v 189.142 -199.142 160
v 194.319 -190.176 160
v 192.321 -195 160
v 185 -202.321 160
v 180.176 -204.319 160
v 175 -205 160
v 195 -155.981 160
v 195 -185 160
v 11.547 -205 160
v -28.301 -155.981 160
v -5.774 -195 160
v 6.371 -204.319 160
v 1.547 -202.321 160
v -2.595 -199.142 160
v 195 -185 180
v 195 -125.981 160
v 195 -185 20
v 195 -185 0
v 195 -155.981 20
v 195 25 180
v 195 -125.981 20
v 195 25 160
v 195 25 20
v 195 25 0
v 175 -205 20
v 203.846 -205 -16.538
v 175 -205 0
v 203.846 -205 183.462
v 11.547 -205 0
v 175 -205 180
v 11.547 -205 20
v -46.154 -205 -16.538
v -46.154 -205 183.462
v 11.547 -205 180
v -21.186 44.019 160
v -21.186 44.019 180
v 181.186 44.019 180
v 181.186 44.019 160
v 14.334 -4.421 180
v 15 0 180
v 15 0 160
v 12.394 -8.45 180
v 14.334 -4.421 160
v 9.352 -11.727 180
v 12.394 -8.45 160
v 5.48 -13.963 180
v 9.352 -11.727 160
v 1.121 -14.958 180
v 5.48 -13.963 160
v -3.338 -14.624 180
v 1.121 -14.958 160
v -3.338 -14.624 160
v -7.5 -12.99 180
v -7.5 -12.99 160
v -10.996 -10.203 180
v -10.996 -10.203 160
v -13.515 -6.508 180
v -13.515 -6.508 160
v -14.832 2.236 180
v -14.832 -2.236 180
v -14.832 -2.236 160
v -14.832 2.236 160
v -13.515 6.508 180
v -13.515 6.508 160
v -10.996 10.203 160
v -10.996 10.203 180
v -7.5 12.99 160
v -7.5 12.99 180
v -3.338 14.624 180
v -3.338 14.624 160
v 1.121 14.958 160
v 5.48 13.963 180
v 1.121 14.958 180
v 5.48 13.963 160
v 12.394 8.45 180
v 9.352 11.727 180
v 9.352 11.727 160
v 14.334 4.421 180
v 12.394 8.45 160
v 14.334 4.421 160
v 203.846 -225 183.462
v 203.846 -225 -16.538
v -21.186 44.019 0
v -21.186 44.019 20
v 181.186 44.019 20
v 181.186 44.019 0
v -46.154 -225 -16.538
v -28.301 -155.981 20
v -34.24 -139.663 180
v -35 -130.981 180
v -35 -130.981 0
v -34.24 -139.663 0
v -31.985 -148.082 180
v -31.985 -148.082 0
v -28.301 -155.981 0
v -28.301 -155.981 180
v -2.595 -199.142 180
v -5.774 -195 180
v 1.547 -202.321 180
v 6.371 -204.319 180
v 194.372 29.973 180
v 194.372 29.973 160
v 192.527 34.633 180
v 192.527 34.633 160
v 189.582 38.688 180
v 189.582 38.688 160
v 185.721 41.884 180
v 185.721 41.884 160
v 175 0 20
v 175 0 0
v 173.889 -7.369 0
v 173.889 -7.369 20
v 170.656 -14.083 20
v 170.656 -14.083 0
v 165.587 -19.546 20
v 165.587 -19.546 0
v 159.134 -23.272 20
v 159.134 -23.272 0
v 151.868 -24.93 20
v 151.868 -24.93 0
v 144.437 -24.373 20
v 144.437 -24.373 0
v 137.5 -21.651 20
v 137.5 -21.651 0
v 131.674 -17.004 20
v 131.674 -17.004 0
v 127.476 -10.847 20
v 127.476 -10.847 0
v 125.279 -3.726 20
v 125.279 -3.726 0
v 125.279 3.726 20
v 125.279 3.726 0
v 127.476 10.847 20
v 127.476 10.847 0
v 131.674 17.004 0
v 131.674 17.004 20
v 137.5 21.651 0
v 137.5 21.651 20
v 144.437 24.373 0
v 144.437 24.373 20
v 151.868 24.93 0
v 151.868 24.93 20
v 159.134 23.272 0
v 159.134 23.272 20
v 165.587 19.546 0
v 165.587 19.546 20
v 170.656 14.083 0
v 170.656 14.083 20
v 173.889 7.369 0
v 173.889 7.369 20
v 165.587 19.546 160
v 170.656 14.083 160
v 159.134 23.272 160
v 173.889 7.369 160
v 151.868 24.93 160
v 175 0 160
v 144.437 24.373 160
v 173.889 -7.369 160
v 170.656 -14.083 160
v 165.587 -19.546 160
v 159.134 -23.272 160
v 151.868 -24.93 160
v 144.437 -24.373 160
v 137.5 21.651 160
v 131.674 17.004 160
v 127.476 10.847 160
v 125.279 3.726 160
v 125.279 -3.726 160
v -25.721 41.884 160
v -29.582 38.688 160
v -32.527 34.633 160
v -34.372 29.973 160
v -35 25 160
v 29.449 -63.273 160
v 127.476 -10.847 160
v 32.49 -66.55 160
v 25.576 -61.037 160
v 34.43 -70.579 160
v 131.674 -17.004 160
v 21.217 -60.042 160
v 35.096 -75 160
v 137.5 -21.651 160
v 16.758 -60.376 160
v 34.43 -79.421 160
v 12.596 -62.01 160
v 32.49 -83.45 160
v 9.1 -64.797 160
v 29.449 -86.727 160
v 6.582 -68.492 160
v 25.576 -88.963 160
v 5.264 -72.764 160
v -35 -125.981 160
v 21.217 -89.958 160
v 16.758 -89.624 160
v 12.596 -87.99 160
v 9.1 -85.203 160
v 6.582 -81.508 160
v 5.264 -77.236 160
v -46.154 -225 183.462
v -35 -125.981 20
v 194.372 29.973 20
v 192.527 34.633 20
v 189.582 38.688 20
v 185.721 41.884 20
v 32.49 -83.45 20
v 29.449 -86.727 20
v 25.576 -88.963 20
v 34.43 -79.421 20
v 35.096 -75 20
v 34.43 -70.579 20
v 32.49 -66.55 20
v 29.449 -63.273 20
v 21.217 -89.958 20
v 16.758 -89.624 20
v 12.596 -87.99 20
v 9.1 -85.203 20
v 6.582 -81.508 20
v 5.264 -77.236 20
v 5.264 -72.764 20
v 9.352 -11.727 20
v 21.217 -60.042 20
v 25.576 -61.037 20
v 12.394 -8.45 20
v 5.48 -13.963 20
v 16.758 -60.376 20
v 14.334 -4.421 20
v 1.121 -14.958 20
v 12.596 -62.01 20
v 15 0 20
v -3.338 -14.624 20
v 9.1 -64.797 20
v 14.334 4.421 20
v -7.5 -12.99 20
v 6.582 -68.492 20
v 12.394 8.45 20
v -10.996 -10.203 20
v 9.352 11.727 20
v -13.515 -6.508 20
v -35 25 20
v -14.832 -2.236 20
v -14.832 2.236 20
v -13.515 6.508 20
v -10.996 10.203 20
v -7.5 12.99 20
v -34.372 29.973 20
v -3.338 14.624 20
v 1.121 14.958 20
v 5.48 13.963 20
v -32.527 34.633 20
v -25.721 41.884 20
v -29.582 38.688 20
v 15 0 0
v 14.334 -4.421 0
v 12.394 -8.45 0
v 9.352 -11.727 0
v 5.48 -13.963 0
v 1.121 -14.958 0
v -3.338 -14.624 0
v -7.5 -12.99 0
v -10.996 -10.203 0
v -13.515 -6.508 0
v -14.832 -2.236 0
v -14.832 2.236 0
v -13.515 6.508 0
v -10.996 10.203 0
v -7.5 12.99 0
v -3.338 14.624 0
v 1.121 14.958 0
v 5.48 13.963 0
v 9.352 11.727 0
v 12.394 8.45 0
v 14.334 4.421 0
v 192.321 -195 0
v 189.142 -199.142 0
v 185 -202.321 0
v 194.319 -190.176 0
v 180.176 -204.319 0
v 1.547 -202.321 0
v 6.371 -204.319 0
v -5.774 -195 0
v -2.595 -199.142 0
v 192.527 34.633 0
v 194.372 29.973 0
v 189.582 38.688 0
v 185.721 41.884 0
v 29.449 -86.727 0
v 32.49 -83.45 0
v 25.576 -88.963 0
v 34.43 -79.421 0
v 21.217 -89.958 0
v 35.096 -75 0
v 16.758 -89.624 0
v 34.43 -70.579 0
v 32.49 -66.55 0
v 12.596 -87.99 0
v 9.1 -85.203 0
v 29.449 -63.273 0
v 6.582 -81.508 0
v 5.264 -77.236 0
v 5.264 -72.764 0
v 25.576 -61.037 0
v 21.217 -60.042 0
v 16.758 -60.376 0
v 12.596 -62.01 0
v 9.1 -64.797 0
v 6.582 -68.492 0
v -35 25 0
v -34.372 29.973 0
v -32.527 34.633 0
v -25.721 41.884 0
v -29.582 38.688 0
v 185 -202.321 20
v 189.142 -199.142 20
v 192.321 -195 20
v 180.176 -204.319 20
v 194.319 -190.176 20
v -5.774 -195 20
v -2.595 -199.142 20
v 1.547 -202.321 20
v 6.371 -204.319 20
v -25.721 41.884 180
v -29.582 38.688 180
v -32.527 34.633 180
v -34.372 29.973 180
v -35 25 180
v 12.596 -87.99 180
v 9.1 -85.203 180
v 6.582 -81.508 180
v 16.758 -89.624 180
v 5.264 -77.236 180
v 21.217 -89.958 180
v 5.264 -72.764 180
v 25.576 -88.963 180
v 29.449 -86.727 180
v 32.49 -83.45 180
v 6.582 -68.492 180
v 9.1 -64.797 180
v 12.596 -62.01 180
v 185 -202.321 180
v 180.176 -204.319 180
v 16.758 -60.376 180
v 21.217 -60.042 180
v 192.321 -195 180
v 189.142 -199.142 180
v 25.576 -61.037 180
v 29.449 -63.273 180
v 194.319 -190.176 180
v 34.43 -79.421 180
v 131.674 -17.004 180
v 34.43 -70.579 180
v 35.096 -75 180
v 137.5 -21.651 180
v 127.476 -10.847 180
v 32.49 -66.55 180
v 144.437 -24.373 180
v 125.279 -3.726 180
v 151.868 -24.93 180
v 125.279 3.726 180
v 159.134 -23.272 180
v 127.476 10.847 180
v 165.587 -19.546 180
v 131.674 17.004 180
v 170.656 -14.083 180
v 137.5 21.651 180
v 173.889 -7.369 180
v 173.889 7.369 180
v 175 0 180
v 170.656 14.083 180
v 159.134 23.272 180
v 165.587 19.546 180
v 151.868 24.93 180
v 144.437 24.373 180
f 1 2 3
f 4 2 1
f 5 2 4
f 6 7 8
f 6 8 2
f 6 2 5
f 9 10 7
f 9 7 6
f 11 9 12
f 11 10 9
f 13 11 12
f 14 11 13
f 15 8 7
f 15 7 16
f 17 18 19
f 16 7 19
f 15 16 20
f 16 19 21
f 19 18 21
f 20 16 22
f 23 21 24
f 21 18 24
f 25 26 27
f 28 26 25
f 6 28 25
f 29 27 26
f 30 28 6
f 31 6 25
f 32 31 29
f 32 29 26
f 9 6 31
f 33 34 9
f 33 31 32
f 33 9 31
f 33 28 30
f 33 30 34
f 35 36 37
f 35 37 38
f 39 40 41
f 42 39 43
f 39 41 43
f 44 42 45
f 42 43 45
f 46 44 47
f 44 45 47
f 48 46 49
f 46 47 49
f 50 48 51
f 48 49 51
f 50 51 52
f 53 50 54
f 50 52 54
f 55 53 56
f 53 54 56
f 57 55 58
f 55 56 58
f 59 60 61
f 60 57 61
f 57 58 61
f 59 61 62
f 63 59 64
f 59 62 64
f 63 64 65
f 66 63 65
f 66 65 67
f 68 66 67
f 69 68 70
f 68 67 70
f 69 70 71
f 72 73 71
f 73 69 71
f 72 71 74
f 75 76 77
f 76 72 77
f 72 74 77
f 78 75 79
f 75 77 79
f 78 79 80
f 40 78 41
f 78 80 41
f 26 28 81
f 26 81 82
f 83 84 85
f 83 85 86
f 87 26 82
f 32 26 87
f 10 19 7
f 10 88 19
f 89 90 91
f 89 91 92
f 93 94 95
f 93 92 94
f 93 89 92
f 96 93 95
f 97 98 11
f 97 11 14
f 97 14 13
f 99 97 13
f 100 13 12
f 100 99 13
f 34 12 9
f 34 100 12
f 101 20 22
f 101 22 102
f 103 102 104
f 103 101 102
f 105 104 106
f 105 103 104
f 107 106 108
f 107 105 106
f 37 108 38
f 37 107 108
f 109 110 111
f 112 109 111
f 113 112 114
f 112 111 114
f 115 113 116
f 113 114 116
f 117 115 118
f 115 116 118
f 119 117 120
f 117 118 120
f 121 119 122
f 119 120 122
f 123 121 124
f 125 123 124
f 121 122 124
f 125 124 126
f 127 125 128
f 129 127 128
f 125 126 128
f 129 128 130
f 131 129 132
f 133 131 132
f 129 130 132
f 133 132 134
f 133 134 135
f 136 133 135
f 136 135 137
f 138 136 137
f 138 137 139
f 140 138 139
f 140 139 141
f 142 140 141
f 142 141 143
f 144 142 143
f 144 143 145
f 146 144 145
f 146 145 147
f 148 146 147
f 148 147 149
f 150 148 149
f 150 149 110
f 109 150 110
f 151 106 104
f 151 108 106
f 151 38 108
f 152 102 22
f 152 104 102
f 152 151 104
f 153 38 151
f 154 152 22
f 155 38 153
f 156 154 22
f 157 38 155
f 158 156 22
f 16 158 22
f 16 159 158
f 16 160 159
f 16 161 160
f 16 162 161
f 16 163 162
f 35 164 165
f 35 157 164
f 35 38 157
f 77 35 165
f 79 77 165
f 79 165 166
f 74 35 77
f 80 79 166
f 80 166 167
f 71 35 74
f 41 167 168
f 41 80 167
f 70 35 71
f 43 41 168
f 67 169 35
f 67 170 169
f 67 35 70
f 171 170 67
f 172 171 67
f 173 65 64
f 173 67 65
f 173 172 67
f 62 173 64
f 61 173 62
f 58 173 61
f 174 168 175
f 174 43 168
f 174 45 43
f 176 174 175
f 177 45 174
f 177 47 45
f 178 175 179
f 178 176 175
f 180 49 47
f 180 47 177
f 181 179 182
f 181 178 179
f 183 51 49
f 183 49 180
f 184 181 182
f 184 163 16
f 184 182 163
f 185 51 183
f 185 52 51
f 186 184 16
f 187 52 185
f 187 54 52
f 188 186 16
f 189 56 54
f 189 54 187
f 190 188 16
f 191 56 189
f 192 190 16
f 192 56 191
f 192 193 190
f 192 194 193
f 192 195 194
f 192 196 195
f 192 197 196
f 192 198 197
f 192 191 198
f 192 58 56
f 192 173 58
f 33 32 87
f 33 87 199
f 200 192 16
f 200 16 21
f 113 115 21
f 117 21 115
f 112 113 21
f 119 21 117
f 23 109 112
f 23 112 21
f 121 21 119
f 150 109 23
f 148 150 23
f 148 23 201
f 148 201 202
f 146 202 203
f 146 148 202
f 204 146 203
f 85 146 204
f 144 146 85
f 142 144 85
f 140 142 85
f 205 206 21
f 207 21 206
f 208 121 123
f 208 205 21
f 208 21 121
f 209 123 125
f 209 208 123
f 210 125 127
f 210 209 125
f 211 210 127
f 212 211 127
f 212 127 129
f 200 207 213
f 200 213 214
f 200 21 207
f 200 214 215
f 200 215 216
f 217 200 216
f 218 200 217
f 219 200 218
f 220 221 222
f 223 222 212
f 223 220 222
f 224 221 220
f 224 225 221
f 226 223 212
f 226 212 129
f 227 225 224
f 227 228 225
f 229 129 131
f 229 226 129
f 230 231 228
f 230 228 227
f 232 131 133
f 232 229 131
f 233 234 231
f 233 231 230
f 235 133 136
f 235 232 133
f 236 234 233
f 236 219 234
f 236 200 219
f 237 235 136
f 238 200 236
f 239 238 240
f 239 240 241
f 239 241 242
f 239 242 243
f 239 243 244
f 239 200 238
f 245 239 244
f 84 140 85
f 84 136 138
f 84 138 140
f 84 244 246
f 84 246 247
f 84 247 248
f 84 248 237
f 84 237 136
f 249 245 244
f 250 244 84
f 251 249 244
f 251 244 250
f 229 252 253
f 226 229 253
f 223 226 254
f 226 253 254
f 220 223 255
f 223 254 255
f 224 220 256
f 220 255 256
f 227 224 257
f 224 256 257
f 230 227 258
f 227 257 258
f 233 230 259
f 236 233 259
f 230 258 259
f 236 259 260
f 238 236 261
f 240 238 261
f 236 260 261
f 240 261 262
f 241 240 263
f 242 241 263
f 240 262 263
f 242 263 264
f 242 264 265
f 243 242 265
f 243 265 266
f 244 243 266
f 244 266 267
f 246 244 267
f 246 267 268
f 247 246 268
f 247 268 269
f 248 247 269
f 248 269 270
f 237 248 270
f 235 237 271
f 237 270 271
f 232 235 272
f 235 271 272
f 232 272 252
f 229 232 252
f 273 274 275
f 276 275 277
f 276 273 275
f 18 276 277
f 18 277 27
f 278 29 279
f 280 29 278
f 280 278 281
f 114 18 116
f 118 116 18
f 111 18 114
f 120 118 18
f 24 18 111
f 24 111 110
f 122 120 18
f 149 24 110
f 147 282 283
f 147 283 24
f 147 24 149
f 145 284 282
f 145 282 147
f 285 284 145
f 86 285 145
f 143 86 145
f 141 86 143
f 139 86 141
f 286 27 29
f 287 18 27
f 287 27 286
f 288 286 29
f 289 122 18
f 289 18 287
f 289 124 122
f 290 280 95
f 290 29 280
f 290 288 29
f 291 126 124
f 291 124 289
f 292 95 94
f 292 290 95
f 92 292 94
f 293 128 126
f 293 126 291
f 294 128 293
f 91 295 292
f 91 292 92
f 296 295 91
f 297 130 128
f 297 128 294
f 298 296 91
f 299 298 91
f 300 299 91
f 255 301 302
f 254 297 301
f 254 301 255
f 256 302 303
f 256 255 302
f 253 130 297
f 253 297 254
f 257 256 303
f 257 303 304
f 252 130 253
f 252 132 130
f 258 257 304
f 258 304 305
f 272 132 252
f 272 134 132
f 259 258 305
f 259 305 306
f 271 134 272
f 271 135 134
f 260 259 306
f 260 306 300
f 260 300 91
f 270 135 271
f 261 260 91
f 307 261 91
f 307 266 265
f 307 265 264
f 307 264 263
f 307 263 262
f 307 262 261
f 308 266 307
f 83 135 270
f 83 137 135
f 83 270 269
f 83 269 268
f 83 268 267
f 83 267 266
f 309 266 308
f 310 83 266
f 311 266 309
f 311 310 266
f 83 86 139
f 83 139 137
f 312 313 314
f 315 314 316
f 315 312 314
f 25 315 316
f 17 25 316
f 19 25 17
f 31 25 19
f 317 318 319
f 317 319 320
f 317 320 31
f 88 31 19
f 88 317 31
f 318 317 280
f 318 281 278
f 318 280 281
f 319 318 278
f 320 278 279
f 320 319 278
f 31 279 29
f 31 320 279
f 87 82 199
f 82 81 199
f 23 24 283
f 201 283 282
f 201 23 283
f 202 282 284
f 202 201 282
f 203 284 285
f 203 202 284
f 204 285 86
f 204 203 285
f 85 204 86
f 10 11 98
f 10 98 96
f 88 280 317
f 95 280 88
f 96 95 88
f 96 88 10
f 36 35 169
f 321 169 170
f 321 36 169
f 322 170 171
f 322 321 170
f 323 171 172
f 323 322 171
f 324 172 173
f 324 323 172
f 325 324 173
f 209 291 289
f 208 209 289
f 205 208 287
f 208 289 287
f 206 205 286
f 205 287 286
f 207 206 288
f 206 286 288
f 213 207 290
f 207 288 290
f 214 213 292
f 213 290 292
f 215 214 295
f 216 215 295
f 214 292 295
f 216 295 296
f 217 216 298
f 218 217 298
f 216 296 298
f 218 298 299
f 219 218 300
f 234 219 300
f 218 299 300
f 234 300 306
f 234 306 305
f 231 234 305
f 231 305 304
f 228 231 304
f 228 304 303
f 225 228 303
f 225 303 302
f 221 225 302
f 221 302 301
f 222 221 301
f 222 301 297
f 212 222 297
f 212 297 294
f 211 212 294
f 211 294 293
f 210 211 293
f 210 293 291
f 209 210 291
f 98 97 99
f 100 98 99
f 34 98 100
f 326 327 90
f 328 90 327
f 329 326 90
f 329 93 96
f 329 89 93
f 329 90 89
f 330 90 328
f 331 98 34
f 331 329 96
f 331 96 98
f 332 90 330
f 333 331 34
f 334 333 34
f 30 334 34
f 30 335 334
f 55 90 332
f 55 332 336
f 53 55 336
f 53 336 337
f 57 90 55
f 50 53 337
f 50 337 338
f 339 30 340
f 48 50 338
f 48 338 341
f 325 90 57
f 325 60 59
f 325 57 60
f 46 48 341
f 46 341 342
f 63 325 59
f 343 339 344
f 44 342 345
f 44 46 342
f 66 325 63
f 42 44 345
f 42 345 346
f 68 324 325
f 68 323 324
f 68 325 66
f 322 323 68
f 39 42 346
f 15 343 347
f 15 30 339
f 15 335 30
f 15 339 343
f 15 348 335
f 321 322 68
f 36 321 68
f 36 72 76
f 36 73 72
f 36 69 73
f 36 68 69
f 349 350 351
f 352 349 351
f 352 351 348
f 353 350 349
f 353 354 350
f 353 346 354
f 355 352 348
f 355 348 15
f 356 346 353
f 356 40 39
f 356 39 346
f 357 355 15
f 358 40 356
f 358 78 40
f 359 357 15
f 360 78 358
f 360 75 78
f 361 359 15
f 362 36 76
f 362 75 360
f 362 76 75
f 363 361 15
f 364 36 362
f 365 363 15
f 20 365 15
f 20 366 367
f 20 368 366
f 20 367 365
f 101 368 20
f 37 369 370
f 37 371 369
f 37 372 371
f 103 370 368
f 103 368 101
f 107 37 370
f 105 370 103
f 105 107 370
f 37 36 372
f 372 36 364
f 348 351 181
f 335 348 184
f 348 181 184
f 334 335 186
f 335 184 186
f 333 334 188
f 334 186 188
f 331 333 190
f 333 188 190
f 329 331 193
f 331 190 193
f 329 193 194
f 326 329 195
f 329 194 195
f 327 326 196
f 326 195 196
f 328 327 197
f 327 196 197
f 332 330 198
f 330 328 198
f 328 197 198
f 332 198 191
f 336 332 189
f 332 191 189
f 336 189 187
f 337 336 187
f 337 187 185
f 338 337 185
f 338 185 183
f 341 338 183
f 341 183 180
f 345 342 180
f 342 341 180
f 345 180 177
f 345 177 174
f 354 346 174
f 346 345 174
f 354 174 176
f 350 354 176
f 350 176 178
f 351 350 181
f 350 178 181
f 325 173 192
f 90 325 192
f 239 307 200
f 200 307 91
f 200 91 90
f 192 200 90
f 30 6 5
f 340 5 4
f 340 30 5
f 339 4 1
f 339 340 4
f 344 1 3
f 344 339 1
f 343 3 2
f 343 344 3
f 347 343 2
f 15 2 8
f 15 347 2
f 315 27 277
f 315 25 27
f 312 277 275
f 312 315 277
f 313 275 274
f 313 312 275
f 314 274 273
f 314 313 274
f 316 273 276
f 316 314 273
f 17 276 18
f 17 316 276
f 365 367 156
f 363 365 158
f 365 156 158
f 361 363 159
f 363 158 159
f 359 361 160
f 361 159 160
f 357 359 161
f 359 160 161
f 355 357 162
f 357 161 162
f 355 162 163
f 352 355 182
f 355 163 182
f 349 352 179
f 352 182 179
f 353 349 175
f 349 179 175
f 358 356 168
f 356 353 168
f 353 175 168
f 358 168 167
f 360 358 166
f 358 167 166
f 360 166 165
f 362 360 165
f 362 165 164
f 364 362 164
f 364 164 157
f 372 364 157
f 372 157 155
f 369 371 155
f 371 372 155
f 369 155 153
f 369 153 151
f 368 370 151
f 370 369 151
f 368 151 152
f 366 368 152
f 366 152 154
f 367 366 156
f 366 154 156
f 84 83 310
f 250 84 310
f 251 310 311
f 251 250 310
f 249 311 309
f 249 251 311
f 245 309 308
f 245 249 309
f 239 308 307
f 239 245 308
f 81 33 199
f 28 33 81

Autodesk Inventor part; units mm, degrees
ref_plane "YZ Plane" through (0, 0, 0) normal (1, 0, 0) x (0, 1, 0)
ref_plane "XY Plane" through (0, 0, 0) normal (0, 0, 1) x (1, 0, 0)
sketch "Sketch1" plane through (0, 0, 0) normal (0, 0, 1) x (1, 0, 0)
  circle A0 centre (0, 0) radius 15
  circle A1 centre (150, 0) radius 25
  line L0 (-35, 45) -> (-35, -144.3782)
  circle A2 centre (43.934, -106.066) radius 15
  circle A3 centre (20.0962, -75) radius 15
  line L1 (195, 45) -> (-35, 45)
  line L2 (195, -205) -> (0, -205)
  line L3 (195, -205) -> (195, 45)
  line L4 (0, -205) -> (-35, -144.3782)
  line L5 (0, -205) -> (70, -205) construction
  dimension "d22" = 230
  dimension "d23" = 120
extrude "Extrusion1" add sketch "Sketch1" along normal blind 180
fillet "Fillet1" radius 50 1 edges at (-35, -144.3782, 90)
fillet "Fillet2" radius 20 1 edges at (-35, 45, 90)
fillet "Fillet3" radius 20 1 edges at (195, 45, 90)
fillet "Fillet4" radius 20 1 edges at (195, -205, 90)
fillet "Fillet5" radius 20 1 edges at (0, -205, 90)
sketch "Sketch2" plane through (-35, -130.9808, 0) normal (-1, 0, 0) x (0, 0, 1)
  line L0 (0, 155.9808) -> (180, 155.9808) projected
  line L1 (0, 155.9808) -> (0, 0) projected
  line L2 (180, 155.9808) -> (180, 0) projected
  line L3 (0, 175) -> (0, -75)
  line L4 (0, -75) -> (20, -75)
  line L5 (20, -75) -> (20, -25)
  line L6 (20, -25) -> (160, -25)
  line L7 (160, -25) -> (160, -75)
  line L8 (160, -75) -> (180, -75)
  line L9 (180, -75) -> (180, 175)
  line L10 (180, 175) -> (160, 175)
  line L11 (160, 175) -> (160, 5)
  line L12 (160, 5) -> (20, 5)
  line L13 (20, 5) -> (20, 175)
  line L14 (20, 175) -> (0, 175)
  point P0 (0, 130.9808)
  dimension "d31" = 250
  dimension "d32" = 20
  dimension "d33" = 50
  dimension "d34" = 140
  dimension "d35" = 170
extrude "Extrusion2" cut sketch "Sketch2" against normal blind 230 contours L3 L14 L13 L0 | L0 L13 L12 L11 L2 L9 L8 L7 L6 L5 L4 L3 L1 | L11 L10 L9 L0 keep common part
sketch "Sketch3" plane through (0, 0, 180) normal (0, 0, 1) x (1, 0, 0)
  circle A0 centre (43.934, -106.066) radius 15 projected
  circle A1 centre (43.934, -106.066) radius 15
extrude "Extrusion3" add sketch "Sketch3" against normal blind 20
sketch "Sketch4" plane through (0, 0, 0) normal (0, 0, -1) x (-1, 0, 0)
  circle A0 centre (-43.934, -106.066) radius 15 projected
  circle A1 centre (-43.934, -106.066) radius 15
extrude "Extrusion4" add sketch "Sketch4" against normal blind 20
ref_plane "Work Plane1" through (175, -205, 20) normal (0, 1, 0) x (-1, 0, 0)
sketch "Sketch6" plane through (175, -205, 20) normal (0, 1, 0) x (-1, 0, 0)
  line L0 (-19.2308, -36.5385) -> (221.1538, -36.5385)
  line L1 (221.1538, -36.5385) -> (221.1538, 163.4615)
  line L2 (221.1538, 163.4615) -> (-28.8462, 163.4615)
  line L3 (-28.8462, 163.4615) -> (-28.8462, -36.5385)
  line L4 (-28.8462, -36.5385) -> (-19.2308, -36.5385)
  point P0 (175, -20)
  dimension "d55" = 250
  dimension "d56" = 200
extrude "Extrusion6" add sketch "Sketch6" against normal blind 20
sketch "Sketch7" plane through (175, -225, 20) normal (0, -1, 0) x (1, 0, 0)
  line L0 (-221.1538, -36.5385) -> (28.8462, -36.5385) projected
  line L1 (28.8462, -36.5385) -> (28.8462, 163.4615) projected
  line L2 (28.8462, 163.4615) -> (-221.1538, 163.4615) projected
  line L3 (-221.1538, 163.4615) -> (-221.1538, -36.5385) projected
  point P0 (-175, -20)
properties part number "sketss"
